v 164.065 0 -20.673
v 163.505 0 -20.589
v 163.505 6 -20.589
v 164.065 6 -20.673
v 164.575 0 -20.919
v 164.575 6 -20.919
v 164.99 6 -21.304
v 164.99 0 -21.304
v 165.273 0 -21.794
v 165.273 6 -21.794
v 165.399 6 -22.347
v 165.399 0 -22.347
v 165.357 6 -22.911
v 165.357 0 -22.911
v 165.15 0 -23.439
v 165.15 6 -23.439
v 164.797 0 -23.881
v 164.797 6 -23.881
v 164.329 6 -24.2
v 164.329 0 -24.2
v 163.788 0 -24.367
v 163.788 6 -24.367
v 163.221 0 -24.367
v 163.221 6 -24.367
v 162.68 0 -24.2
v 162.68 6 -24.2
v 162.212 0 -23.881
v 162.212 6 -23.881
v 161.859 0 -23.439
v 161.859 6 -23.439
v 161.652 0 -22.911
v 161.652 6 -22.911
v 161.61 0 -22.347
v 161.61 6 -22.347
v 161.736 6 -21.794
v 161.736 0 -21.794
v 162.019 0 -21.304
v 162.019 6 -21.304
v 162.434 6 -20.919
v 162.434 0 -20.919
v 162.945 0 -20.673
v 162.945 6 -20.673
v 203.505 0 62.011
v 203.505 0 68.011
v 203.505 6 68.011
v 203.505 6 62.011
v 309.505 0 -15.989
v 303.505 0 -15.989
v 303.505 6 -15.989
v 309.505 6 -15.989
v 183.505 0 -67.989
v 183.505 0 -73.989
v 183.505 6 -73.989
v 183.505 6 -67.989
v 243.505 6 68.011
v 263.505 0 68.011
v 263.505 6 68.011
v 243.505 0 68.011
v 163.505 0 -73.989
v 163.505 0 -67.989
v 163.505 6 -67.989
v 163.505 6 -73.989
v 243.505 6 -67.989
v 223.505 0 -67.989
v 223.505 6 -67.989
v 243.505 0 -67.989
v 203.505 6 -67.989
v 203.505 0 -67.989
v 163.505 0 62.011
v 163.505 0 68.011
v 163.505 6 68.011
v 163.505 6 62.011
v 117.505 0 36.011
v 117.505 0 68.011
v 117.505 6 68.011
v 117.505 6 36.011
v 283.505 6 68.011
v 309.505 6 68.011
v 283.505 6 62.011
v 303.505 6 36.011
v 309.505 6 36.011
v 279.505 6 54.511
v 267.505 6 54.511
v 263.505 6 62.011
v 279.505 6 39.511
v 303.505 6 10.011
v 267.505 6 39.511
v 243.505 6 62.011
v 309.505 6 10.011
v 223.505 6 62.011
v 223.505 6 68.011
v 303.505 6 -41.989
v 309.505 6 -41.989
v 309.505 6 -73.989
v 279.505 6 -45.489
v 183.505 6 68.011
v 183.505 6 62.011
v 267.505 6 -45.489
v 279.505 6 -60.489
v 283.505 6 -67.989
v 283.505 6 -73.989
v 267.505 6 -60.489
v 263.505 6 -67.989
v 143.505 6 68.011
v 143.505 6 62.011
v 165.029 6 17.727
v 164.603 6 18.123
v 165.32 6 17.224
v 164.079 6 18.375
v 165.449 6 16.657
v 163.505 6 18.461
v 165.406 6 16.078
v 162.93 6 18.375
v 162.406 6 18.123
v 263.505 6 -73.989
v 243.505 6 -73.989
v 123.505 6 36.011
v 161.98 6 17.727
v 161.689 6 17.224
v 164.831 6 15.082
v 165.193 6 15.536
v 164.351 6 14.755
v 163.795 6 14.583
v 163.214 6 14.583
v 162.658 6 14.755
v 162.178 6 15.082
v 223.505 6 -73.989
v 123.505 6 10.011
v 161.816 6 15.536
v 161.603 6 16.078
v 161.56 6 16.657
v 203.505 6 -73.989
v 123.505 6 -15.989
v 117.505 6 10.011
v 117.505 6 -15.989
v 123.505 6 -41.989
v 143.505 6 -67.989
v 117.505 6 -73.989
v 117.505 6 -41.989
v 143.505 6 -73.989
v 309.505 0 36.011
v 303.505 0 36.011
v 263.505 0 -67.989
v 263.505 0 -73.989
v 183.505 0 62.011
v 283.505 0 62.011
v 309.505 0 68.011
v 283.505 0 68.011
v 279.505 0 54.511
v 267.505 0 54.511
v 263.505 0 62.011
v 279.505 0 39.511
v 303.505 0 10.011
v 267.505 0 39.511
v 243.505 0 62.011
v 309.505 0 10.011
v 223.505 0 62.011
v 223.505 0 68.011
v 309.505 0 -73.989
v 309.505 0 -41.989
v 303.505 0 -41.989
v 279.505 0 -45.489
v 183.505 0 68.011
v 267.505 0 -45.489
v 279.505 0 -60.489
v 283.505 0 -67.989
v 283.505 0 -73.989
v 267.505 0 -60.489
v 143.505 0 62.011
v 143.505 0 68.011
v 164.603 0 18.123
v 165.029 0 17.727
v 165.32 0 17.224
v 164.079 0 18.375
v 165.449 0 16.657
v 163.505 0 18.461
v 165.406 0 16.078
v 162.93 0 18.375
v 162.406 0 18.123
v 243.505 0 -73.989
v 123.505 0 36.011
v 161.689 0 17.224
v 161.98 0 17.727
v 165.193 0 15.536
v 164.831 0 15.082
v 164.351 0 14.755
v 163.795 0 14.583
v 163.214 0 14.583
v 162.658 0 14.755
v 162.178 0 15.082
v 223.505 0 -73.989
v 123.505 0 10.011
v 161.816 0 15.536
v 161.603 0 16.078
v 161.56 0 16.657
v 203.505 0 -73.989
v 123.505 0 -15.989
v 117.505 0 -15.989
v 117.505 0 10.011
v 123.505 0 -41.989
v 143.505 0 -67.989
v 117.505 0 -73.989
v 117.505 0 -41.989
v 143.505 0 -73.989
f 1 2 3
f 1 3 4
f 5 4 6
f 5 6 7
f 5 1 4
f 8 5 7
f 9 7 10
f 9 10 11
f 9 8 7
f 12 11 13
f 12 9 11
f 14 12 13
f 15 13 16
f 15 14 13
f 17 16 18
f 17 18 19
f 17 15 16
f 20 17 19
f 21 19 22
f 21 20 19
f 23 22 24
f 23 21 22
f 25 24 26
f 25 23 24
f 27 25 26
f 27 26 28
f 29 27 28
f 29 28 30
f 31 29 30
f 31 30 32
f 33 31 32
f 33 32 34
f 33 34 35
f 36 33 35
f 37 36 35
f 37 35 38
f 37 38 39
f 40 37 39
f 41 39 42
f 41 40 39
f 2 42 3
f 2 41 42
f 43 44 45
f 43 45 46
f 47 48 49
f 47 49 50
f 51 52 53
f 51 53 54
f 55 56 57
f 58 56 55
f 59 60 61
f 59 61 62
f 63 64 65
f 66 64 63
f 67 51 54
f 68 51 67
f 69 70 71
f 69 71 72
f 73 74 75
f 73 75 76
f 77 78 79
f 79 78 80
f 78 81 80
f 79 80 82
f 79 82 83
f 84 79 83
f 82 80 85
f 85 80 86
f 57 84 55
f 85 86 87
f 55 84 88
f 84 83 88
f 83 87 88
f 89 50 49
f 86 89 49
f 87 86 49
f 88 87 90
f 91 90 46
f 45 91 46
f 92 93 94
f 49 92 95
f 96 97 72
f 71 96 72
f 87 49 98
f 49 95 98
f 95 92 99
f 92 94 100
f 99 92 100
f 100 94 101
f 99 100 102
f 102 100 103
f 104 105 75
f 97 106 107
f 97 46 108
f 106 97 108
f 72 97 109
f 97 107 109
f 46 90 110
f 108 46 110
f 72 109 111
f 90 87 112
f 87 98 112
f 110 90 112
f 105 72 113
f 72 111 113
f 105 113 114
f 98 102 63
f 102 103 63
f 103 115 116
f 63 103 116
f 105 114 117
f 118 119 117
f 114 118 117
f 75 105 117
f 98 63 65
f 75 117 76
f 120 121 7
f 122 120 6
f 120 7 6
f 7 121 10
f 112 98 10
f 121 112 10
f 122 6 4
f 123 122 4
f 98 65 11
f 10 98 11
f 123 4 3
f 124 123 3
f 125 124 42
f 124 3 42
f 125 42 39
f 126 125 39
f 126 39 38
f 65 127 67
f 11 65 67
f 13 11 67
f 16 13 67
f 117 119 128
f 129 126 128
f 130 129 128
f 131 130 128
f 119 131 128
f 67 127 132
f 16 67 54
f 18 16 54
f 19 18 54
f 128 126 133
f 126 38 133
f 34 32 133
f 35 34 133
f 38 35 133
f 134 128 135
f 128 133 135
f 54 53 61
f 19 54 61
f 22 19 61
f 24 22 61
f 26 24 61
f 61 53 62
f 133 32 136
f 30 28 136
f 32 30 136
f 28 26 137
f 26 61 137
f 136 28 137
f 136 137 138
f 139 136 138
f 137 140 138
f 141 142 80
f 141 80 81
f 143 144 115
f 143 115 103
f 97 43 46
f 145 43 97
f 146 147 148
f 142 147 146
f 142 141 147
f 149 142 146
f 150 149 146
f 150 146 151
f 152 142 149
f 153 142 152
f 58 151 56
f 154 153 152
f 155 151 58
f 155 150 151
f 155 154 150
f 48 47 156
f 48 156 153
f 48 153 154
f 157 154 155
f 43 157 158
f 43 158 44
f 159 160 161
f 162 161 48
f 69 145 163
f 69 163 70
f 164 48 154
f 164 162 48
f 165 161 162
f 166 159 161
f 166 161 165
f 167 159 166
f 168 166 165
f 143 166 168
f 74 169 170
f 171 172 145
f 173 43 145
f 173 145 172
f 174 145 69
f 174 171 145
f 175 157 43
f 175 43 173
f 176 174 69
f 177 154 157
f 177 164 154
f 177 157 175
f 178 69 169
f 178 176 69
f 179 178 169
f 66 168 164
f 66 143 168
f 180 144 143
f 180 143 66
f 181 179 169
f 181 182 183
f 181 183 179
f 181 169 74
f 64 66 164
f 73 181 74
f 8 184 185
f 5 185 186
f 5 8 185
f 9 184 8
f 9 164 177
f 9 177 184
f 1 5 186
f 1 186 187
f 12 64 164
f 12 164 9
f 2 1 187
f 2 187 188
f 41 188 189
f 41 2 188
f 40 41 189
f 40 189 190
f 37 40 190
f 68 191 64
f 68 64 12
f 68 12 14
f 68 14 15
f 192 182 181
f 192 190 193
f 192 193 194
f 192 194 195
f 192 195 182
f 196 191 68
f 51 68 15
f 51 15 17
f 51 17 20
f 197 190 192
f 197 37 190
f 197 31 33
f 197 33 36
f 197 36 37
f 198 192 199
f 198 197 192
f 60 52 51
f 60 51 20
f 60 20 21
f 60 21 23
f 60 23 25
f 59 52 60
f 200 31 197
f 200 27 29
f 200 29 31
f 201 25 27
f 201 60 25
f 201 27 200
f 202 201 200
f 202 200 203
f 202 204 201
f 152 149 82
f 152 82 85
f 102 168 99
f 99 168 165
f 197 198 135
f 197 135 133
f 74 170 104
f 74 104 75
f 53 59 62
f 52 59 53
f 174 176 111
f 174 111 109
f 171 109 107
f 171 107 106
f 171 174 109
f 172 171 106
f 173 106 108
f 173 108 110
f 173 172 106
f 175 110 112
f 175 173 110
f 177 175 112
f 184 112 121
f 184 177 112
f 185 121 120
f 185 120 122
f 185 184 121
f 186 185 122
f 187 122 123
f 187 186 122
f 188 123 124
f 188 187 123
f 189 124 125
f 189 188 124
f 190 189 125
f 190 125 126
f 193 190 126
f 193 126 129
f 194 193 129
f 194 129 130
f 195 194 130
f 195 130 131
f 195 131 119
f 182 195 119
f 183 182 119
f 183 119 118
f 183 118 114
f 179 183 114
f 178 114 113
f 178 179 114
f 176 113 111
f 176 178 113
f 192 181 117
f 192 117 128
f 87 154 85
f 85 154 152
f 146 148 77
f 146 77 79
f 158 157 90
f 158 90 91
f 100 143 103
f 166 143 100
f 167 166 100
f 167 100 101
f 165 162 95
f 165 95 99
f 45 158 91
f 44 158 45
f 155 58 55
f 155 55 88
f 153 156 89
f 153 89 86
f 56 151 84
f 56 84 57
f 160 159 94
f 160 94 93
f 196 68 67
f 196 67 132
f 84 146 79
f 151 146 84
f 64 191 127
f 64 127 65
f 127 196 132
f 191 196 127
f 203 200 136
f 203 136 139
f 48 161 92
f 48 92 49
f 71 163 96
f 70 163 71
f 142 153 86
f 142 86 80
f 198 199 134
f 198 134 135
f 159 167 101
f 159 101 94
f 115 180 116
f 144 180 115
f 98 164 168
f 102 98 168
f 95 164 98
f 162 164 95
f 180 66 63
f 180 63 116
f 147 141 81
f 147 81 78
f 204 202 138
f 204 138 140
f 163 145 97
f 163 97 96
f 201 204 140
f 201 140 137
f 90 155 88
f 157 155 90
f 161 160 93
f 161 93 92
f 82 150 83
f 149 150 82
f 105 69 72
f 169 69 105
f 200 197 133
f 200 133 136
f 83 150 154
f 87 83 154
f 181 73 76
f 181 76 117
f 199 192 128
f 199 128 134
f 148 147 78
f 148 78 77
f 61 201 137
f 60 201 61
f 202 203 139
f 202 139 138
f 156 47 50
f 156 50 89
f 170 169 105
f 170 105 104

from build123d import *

# Parameters (mm, degrees)
SKETCH2_R           = 1.9
SKETCH2_R_2         = 1.95
SKETCH2_W           = 12
SKETCH2_H           = 15
BOSS_EXTRUDE2_DEPTH = 6


with BuildPart() as part:
    # Sketch2 → Boss-Extrude2 (new body)
    with BuildSketch(Plane(origin=(0, 0, 0), x_dir=(1, 0, 0), z_dir=(0, 1, 0))):
        Polygon((203.50455835, 73.988552732), (223.50455835, 73.988552732), (223.50455835, 67.988552732), (243.50455835, 67.988552732), (243.50455835, 73.988552732), (263.50455835, 73.988552732), (263.50455835, 67.988552732), (283.50455835, 67.988552732), (283.50455835, 73.988552732), (309.50455835, 73.988552732), (309.50455835, 41.988552732), (303.50455835, 41.988552732), (303.50455835, 15.988552732), (309.50455835, 15.988552732), (309.50455835, -10.011447268), (303.50455835, -10.011447268), (303.50455835, -36.011447268), (309.50455835, -36.011447268), (309.50455835, -68.011447268), (283.50455835, -68.011447268), (283.50455835, -62.011447268), (263.50455835, -62.011447268), (263.50455835, -68.011447268), (243.50455835, -68.011447268), (243.50455835, -62.011447268), (223.50455835, -62.011447268), (223.50455835, -68.011447268), (203.50455835, -68.011447268), (203.50455835, -62.011447268), (183.50455835, -62.011447268), (183.50455835, -68.011447268), (163.50455835, -68.011447268), (163.50455835, -62.011447268), (143.50455835, -62.011447268), (143.50455835, -68.011447268), (117.50455835, -68.011447268), (117.50455835, -36.011447268), (123.50455835, -36.011447268), (123.50455835, -10.011447268), (117.50455835, -10.011447268), (117.50455835, 15.988552732), (123.50455835, 15.988552732), (123.50455835, 41.988552732), (117.50455835, 41.988552732), (117.50455835, 73.988552732), (143.50455835, 73.988552732), (143.50455835, 67.988552732), (163.50455835, 67.988552732), (163.50455835, 73.988552732), (183.50455835, 73.988552732), (183.50455835, 67.988552732), (203.50455835, 67.988552732), align=None)
        with Locations(Location((163.50455835, 22.488552732, 0), (0, 0, 270))):
            Circle(SKETCH2_R, mode=Mode.SUBTRACT)
        with Locations(Location((163.50455835, -16.511447268, 0), (0, 0, 270))):
            Circle(SKETCH2_R_2, mode=Mode.SUBTRACT)
        with Locations((273.50455835, -47.011447268)):
            Rectangle(SKETCH2_W, SKETCH2_H, mode=Mode.SUBTRACT)
        with Locations((273.50455835, 52.988552732)):
            Rectangle(SKETCH2_W, SKETCH2_H, mode=Mode.SUBTRACT)
    extrude(amount=BOSS_EXTRUDE2_DEPTH)


solid = part.part
